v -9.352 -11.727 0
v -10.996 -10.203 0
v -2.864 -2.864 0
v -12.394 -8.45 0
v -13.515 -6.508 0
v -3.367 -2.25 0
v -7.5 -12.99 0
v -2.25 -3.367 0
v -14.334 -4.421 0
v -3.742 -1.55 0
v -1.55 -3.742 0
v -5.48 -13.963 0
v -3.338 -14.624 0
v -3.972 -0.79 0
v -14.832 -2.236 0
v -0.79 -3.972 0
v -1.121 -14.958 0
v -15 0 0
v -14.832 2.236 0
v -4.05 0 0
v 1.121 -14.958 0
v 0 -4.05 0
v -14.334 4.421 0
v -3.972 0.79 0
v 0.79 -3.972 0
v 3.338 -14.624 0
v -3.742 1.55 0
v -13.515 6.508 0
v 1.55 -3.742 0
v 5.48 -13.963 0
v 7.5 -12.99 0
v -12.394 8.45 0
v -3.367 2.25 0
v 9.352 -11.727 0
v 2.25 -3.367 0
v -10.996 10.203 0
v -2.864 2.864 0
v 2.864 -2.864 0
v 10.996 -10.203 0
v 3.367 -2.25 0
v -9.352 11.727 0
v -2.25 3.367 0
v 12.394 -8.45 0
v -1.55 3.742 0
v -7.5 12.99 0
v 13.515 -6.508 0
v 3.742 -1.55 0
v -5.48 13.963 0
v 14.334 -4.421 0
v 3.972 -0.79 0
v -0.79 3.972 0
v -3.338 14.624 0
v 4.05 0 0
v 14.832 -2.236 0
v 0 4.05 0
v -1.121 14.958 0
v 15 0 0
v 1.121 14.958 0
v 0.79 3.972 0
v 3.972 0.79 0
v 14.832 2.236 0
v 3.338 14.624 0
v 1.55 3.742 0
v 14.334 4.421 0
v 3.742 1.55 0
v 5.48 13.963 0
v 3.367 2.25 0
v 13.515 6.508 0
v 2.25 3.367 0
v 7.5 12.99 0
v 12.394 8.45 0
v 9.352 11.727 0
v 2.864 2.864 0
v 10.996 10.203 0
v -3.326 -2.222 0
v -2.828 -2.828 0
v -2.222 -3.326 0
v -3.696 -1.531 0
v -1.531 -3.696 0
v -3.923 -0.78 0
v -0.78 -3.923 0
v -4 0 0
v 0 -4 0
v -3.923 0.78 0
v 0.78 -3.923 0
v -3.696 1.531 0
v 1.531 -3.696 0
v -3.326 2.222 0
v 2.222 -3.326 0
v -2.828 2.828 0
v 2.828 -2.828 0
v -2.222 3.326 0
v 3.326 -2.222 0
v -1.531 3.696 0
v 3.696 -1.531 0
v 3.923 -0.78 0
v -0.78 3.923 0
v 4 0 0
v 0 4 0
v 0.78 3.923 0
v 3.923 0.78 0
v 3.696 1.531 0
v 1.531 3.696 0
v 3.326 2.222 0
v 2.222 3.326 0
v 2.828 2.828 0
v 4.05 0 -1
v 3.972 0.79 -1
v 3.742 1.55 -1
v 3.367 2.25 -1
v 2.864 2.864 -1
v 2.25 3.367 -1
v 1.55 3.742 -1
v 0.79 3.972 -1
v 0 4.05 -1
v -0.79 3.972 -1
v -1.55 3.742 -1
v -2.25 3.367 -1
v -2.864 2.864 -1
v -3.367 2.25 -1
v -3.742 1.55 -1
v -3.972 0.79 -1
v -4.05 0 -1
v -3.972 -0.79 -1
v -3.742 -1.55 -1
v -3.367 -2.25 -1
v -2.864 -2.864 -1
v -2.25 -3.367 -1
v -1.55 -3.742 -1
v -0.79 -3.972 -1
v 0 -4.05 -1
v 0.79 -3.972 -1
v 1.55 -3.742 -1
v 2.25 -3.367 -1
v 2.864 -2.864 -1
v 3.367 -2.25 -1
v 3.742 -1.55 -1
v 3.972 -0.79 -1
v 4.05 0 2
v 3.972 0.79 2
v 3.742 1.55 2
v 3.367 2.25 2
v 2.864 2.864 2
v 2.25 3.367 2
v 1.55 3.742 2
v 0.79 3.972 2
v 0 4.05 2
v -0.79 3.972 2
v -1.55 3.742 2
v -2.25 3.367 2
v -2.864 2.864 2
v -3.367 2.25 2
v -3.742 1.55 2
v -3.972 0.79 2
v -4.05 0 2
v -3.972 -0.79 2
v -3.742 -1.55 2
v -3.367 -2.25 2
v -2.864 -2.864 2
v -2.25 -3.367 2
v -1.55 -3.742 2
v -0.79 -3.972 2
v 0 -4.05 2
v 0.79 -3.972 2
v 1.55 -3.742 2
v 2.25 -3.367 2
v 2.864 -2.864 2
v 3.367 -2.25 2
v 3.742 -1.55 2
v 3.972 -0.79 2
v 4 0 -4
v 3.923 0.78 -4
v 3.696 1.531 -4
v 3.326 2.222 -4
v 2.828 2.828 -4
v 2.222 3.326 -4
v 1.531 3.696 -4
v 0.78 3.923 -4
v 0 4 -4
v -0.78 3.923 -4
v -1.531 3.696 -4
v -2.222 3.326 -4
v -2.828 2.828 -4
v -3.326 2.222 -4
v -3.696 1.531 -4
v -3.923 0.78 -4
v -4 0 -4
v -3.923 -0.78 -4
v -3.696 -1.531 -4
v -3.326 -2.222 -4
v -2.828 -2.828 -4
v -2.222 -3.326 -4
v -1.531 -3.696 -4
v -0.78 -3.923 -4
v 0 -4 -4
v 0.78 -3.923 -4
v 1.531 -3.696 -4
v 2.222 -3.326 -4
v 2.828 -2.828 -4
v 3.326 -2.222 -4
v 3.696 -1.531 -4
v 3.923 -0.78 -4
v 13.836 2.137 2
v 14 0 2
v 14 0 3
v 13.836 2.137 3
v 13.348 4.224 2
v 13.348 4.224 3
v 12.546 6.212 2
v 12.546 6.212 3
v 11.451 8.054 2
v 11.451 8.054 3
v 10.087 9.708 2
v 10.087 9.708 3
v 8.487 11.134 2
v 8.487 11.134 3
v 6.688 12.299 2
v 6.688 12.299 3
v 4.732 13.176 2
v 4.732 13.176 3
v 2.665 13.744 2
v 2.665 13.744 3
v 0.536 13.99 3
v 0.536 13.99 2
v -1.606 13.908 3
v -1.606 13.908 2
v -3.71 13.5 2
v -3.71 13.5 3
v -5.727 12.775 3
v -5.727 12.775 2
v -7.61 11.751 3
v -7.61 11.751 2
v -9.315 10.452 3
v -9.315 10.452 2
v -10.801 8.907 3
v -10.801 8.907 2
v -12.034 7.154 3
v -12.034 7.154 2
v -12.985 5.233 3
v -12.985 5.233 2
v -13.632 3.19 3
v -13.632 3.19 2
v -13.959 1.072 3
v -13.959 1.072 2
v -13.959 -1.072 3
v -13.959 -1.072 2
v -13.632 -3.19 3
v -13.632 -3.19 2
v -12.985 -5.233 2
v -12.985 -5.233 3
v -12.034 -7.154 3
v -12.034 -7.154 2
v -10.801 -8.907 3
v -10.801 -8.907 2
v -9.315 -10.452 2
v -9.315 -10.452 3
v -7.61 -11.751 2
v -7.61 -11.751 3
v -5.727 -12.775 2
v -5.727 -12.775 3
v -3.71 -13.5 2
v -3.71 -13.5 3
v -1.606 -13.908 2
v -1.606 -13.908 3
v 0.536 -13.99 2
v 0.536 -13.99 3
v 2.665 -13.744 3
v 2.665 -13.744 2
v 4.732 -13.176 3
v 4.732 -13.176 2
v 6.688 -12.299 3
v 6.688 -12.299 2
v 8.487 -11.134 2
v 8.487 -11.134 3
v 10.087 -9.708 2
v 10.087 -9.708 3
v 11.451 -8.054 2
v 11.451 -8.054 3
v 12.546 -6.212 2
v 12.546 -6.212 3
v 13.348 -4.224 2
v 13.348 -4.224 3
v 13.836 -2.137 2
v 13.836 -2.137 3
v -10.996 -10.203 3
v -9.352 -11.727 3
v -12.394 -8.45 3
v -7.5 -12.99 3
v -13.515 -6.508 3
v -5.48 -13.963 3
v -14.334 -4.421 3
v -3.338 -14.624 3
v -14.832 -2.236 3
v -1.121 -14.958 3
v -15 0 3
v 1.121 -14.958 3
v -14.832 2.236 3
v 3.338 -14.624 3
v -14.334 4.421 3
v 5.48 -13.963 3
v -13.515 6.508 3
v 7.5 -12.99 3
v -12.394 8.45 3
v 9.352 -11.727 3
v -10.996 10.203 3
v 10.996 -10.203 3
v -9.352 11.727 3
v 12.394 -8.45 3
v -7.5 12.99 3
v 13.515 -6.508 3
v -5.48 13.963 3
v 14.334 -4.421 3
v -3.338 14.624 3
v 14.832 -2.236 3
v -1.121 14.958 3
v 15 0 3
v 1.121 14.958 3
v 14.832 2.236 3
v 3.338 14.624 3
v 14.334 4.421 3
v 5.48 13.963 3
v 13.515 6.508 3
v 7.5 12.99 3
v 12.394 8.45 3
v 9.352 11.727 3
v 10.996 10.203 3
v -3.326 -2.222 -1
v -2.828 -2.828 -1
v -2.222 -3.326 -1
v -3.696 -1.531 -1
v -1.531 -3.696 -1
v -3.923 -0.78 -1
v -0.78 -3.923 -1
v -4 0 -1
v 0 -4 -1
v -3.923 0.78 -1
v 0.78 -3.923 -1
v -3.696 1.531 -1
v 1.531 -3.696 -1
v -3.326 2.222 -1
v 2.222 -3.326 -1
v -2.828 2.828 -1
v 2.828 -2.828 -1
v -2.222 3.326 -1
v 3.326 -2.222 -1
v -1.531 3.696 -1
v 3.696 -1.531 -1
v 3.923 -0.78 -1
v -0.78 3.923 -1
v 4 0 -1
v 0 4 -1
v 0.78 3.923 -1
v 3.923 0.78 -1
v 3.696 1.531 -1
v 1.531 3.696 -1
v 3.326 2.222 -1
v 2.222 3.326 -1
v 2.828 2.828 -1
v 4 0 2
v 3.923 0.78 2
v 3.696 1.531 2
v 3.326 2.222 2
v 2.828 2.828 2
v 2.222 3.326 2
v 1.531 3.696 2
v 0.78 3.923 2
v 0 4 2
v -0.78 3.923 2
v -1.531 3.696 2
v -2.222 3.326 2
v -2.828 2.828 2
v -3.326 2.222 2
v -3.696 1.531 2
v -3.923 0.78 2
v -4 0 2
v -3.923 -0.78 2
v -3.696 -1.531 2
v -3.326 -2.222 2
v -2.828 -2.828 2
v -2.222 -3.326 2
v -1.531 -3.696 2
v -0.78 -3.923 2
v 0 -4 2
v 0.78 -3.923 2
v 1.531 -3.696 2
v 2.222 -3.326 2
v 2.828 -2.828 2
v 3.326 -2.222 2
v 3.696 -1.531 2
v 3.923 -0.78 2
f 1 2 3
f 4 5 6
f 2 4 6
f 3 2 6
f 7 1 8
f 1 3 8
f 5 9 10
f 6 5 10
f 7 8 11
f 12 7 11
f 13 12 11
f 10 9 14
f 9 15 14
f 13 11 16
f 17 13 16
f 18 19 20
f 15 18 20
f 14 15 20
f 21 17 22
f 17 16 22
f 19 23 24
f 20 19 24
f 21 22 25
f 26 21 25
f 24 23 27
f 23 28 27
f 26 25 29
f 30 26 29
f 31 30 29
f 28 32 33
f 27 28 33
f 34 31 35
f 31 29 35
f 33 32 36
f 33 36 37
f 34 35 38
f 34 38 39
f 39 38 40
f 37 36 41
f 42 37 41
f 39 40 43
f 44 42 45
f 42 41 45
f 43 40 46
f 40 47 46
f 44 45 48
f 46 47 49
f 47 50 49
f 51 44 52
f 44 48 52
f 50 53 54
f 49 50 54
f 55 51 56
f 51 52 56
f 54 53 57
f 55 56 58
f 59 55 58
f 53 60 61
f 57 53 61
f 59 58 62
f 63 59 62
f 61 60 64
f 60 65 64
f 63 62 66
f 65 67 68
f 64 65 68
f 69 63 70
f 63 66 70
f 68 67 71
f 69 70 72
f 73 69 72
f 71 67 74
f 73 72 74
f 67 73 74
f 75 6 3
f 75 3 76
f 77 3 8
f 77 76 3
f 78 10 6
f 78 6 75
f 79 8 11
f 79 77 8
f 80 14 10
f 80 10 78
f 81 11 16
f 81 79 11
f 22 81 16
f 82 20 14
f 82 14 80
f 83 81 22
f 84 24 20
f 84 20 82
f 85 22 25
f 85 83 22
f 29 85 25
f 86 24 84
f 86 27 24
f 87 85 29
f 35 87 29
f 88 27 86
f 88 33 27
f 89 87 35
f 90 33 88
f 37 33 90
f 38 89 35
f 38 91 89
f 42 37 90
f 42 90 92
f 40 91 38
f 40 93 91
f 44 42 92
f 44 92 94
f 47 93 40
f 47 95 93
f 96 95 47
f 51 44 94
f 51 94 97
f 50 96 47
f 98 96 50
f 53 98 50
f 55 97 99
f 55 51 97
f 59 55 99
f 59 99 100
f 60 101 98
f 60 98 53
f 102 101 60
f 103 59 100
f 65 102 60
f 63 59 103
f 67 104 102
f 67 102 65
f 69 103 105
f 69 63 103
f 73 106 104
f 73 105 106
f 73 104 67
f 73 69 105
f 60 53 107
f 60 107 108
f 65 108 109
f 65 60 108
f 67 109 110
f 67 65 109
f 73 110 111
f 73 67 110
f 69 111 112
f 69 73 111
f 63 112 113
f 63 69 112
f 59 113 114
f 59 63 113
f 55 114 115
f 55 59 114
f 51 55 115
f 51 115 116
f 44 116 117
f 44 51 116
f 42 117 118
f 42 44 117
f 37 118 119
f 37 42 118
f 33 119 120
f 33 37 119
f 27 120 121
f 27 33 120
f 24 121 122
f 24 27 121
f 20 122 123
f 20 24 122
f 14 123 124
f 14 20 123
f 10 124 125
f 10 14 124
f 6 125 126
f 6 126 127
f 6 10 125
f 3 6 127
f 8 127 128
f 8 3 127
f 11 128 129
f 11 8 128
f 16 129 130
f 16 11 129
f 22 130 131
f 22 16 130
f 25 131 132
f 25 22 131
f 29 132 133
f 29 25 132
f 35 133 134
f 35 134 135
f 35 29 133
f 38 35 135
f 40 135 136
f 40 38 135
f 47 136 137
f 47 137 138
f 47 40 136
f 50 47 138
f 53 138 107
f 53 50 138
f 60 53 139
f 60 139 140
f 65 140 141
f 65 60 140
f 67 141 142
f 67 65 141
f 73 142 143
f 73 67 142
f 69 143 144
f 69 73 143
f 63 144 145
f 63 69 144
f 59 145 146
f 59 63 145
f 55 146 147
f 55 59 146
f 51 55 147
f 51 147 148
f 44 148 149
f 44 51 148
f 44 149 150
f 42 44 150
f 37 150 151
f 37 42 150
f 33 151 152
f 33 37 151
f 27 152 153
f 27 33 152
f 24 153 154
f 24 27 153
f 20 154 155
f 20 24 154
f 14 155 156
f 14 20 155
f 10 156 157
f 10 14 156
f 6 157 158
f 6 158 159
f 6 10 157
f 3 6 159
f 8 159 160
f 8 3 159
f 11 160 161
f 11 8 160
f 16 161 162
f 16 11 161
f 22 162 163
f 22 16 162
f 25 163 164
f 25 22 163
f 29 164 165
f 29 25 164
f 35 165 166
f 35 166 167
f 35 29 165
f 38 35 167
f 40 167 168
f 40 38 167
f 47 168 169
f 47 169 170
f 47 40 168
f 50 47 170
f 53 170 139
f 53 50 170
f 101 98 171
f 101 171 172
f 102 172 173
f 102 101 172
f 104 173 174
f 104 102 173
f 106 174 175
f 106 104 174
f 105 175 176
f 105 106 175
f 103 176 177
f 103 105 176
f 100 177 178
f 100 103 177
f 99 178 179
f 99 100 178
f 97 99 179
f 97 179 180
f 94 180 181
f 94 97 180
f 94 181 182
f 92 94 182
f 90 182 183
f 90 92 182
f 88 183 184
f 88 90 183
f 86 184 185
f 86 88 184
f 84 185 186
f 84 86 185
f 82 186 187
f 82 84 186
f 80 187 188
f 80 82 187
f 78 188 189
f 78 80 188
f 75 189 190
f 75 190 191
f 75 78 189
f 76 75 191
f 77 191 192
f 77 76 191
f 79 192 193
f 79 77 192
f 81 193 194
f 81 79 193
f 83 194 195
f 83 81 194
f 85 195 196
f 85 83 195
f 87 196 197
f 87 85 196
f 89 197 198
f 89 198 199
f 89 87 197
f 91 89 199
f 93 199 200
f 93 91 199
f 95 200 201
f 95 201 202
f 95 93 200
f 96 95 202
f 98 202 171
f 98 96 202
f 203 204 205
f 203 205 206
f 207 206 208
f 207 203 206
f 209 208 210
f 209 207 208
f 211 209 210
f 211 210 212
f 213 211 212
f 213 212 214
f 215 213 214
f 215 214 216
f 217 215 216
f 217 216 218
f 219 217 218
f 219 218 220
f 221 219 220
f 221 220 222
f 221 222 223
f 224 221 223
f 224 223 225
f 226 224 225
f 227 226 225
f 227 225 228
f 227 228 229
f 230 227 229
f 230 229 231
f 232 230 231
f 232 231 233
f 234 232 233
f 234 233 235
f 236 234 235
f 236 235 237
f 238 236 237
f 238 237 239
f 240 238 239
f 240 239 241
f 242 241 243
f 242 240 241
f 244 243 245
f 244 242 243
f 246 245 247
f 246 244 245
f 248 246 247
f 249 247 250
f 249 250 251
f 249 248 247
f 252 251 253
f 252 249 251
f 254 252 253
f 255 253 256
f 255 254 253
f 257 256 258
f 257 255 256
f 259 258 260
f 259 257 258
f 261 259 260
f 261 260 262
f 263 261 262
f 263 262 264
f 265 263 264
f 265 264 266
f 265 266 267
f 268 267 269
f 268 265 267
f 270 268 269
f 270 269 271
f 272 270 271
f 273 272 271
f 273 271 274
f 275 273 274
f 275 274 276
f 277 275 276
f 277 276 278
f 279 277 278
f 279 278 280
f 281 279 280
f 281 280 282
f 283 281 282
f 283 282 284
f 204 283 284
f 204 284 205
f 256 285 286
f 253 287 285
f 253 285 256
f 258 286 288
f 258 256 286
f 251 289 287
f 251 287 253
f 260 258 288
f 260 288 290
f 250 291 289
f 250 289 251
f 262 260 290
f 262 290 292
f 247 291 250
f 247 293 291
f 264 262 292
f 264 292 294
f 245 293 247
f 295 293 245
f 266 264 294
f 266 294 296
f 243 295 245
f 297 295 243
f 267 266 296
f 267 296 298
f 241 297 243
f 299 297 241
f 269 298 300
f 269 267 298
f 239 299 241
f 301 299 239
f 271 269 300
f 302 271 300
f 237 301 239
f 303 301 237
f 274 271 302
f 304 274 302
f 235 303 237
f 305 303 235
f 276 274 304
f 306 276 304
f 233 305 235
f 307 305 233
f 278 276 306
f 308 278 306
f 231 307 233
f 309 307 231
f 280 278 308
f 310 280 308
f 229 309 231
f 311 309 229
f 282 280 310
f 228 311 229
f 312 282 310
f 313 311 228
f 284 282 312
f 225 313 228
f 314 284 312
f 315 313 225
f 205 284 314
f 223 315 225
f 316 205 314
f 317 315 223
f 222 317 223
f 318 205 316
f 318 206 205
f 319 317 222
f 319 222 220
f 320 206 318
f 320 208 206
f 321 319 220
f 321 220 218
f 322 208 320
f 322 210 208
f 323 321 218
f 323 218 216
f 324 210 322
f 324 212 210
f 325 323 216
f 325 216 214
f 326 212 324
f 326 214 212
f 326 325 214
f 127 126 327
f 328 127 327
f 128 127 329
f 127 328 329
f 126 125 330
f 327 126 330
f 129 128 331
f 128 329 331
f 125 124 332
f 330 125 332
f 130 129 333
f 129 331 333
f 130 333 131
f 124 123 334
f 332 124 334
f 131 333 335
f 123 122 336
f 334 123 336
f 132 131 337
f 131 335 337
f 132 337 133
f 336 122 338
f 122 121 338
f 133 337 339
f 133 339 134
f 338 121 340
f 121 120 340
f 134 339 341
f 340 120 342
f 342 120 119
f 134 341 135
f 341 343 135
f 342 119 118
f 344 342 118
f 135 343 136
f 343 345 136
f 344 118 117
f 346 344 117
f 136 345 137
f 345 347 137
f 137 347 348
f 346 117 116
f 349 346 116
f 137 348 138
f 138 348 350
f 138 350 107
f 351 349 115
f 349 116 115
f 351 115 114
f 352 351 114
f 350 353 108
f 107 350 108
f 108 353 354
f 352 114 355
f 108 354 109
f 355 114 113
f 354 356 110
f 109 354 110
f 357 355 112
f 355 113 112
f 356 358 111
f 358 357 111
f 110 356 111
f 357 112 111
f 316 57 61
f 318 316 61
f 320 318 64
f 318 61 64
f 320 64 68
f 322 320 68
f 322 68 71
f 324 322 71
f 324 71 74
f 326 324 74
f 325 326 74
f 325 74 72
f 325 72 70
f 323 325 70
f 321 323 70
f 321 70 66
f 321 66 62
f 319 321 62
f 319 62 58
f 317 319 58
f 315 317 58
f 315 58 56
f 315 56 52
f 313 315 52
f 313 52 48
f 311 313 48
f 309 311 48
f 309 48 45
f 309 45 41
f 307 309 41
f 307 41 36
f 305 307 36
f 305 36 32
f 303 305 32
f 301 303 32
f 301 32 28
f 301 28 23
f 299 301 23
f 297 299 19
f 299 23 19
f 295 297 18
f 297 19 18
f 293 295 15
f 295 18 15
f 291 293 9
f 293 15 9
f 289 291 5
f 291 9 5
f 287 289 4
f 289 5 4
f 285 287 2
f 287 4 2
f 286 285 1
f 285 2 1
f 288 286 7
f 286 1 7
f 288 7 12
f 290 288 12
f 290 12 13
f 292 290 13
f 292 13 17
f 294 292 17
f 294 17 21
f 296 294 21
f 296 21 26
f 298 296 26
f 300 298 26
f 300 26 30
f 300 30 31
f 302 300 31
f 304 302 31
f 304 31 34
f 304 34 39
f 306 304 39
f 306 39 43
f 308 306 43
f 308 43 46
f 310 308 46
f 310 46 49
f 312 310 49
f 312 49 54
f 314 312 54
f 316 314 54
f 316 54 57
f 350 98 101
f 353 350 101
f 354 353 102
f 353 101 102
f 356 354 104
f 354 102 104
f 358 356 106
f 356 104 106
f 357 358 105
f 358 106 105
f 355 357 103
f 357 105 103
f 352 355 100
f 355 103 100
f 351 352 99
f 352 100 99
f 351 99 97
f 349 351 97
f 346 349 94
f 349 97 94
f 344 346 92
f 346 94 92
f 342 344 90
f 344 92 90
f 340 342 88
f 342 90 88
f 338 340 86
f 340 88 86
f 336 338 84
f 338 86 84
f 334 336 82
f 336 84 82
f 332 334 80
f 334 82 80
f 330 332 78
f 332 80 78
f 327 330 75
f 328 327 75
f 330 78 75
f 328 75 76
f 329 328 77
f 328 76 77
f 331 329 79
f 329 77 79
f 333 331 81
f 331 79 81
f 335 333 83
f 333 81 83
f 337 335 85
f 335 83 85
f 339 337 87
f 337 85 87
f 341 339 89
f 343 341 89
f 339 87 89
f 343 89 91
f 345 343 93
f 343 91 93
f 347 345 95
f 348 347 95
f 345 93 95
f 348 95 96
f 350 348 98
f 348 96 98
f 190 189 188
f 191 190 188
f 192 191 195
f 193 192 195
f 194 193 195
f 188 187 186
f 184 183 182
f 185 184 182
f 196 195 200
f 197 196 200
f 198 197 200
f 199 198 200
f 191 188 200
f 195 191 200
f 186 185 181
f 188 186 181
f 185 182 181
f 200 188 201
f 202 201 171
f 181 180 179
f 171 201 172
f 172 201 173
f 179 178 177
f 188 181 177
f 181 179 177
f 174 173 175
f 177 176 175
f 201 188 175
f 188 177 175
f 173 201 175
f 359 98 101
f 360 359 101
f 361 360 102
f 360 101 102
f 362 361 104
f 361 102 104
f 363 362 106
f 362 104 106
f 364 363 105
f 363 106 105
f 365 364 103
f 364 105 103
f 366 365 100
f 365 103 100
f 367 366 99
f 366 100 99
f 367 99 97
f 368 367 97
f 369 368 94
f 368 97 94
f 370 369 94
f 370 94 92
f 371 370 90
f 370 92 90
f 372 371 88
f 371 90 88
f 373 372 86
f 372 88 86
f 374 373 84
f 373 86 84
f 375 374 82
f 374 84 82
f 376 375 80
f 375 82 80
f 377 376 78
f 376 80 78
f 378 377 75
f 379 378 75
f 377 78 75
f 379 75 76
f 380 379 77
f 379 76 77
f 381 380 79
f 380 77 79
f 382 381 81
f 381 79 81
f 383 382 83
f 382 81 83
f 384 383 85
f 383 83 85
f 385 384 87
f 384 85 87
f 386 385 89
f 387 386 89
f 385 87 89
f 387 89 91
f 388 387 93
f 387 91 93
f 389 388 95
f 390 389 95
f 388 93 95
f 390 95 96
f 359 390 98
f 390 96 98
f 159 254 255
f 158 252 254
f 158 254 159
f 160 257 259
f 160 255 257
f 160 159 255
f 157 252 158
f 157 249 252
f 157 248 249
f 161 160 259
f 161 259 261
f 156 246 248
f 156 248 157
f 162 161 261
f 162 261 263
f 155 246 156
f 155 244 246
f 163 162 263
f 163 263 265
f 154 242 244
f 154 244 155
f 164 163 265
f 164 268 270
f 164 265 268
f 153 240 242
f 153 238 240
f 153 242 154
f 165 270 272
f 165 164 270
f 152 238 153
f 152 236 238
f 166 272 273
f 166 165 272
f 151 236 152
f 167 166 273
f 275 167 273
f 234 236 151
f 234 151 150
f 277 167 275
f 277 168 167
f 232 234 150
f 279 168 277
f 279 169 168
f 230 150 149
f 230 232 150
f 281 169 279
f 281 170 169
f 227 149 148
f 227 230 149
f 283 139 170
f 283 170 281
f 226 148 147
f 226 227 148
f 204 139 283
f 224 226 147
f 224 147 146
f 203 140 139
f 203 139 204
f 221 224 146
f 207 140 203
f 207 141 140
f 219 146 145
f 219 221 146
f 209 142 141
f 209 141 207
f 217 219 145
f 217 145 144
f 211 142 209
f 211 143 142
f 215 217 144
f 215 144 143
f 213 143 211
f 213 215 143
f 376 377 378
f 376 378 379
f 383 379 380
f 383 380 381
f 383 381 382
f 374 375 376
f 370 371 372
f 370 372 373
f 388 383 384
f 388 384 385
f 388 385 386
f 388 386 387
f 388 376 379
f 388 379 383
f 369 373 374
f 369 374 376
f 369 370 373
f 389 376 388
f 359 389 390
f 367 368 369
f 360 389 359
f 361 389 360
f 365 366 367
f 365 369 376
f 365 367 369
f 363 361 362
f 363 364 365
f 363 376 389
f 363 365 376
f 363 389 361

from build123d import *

# Parameters (mm, degrees)
F0_R     = 4
F1_DEPTH = 4
F0_R_2   = 4.05
F2_DEPTH = 1
F3_DEPTH = 2
F0_R_3   = 15
F0_R_4   = 14
F0_R_5   = 11
F4_DEPTH = 3


with BuildPart() as f1:
    # F0 (on Top) → F1 (new body)
    with BuildSketch(Plane.XY):
        Circle(F0_R)
    extrude(amount=-F1_DEPTH)

    # F0 (on Top) → F3 (join)
    with BuildSketch(Plane.XY):
        Circle(F0_R)
    extrude(amount=F3_DEPTH)


with BuildPart() as f2:
    # F0 (on Top) → F2 (new body)
    with BuildSketch(Plane.XY):
        Circle(F0_R_2)
        Circle(F0_R, mode=Mode.SUBTRACT)
    extrude(amount=-F2_DEPTH)


with BuildPart() as f3:
    # F0 (on Top) → F3, piece 2 (new body)
    with BuildSketch(Plane.XY):
        Circle(F0_R_3)
        Circle(F0_R_4, mode=Mode.SUBTRACT)
        Circle(F0_R_4)
        Circle(F0_R_5, mode=Mode.SUBTRACT)
        Circle(F0_R_5)
        Circle(F0_R_2, mode=Mode.SUBTRACT)
    extrude(amount=F3_DEPTH)

    # F0 (on Top) → F4 (join)
    with BuildSketch(Plane.XY):
        Circle(F0_R_3)
        Circle(F0_R_4, mode=Mode.SUBTRACT)
    extrude(amount=F4_DEPTH)


solid = Compound([f1.part, f2.part, f3.part])
